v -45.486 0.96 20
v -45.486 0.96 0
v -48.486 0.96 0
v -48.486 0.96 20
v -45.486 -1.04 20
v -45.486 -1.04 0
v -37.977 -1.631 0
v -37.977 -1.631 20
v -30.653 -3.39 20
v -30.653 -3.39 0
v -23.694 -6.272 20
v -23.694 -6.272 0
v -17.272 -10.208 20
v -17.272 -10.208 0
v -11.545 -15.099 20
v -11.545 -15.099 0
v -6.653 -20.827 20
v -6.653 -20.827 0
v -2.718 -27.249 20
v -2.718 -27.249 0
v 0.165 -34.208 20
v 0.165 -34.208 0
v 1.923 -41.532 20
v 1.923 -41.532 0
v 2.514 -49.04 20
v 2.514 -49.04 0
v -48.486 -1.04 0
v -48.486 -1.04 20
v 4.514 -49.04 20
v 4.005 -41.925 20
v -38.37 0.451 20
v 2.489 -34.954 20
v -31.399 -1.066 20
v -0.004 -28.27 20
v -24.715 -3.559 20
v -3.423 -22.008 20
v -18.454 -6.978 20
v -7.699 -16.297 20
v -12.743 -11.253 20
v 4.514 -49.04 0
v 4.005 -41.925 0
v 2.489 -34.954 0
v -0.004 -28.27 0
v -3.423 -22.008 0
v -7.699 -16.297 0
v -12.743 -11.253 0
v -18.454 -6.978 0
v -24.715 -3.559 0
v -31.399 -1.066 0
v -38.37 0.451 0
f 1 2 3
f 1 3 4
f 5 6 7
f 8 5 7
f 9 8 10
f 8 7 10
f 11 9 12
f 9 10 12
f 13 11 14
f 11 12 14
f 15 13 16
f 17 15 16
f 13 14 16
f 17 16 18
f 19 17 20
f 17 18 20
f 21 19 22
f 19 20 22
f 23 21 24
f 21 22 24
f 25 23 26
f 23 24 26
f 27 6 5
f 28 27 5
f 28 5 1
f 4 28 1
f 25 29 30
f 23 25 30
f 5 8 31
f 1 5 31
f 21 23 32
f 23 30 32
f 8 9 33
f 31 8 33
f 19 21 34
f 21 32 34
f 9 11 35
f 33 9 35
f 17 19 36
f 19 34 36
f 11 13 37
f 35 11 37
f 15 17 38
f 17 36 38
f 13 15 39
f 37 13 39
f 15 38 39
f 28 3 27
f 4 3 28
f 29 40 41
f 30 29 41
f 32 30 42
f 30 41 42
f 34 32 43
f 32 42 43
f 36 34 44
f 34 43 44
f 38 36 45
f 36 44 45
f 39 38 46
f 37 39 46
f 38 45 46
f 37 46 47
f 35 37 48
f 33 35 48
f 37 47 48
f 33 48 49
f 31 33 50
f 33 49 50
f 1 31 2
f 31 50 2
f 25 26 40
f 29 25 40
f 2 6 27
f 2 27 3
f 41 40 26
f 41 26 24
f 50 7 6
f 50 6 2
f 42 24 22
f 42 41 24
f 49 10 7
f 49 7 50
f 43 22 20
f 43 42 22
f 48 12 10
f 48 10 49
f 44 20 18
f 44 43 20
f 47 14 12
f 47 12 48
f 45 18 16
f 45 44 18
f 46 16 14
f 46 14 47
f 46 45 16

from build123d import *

# Parameters (mm, degrees)
BOSS_EXTRUDE1_DEPTH = 20
SKETCH2_W           = 20
SKETCH2_H           = 2
BOSS_EXTRUDE2_DEPTH = 3


with BuildPart() as part:
    # Sketch1 → Boss-Extrude1 (new body)
    with BuildSketch(Plane.XY):
        with BuildLine():
            Line((-45.486032275, 0.959524002), (-45.486032275, -1.040475998))
            ThreePointArc((-45.486032275, -1.040475998), (-11.544906778, -15.099350501), (2.513967725, -49.040475998))
            Line((2.513967725, -49.040475998), (4.513967725, -49.040475998))
            ThreePointArc((4.513967725, -49.040475998), (-10.130693215, -13.685136939), (-45.486032275, 0.959524002))
        make_face()
    extrude(amount=BOSS_EXTRUDE1_DEPTH)

    # Sketch2 → Boss-Extrude2 (add)
    with BuildSketch(Plane.ZY.offset(45.486032275)):
        with Locations((10, -0.040475998)):
            Rectangle(SKETCH2_W, SKETCH2_H)
    extrude(amount=BOSS_EXTRUDE2_DEPTH)


solid = part.part
